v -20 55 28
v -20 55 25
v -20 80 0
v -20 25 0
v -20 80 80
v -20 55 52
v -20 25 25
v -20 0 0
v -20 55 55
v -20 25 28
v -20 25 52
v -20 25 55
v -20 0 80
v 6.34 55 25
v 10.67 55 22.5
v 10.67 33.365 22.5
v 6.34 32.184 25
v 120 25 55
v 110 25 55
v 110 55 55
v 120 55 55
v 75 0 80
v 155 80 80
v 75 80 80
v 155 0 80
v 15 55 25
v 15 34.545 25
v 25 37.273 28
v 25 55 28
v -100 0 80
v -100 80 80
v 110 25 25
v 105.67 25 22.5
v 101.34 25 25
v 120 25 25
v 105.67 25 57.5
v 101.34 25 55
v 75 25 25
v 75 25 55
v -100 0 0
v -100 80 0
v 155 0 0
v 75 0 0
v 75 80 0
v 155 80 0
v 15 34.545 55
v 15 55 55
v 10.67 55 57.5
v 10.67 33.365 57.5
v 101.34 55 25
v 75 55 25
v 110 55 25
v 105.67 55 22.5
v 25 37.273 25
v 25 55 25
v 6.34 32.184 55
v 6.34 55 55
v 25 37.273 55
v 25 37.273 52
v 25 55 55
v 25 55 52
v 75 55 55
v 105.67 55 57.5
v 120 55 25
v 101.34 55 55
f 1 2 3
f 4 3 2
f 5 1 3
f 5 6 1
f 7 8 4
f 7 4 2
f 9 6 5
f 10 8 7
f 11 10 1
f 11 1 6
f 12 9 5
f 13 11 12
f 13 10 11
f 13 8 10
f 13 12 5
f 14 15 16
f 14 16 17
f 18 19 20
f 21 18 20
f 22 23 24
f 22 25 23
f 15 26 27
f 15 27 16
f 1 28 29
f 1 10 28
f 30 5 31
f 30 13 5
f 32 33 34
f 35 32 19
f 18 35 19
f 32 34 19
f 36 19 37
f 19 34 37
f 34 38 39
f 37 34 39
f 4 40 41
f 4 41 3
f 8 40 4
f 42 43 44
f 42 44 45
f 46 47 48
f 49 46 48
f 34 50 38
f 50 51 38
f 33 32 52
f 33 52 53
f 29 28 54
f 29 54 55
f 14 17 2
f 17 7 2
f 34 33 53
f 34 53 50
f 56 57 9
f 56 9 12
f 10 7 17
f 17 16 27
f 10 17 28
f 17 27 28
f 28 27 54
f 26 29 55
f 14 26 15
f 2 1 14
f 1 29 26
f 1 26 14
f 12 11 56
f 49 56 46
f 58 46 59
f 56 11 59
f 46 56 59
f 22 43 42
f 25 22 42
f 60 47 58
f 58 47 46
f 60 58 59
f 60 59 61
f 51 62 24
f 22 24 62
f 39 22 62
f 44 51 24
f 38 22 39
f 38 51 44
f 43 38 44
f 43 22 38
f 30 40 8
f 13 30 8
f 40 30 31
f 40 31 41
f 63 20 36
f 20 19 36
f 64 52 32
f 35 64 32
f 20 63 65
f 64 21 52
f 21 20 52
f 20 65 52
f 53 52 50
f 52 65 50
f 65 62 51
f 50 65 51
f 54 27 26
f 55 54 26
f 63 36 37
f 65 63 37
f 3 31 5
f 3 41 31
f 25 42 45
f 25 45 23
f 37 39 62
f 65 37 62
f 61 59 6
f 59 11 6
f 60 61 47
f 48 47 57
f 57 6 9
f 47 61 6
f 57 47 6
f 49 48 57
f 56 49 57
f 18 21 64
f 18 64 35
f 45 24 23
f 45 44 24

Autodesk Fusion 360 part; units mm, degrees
sketch "Sketch1" plane through (0, 0, 0) normal (0, 1, 0) x (1, 0, 0)
  line L0 (-100, 0) -> (-20, 0)
  line L1 (-20, 0) -> (-20, -80)
  line L2 (-20, -80) -> (-100, -80)
  line L3 (-100, -80) -> (-100, 0)
  line L4 (75, 0) -> (155, 0)
  line L5 (155, 0) -> (155, -80)
  line L6 (155, -80) -> (75, -80)
  line L7 (75, -80) -> (75, 0)
  dimension "d1" = 80
  dimension "d2" = 80
  dimension "d3" = 80
  dimension "d4" = 80
extrude "Extrude1" add sketch "Sketch1" along normal blind 80 contours L0 L1 L2 L3 makes body 1
extrude "Extrude2" add sketch "Sketch1" along normal blind 80 separate body contours L4 L5 L6 L7 makes body 2
sketch "Sketch2" plane through (75, 0, 0) normal (-1, 0, 0) x (0, -1, 0)
  line L0 (0, 0) -> (0, 80)
  line L1 (0, 80) -> (-80, 80)
  line L2 (-80, 80) -> (-80, 0)
  line L3 (-80, 0) -> (0, 0)
  line L4 (-55, 25) -> (-25, 25)
  line L5 (-25, 25) -> (-25, 55)
  line L6 (-25, 55) -> (-55, 55)
  line L7 (-55, 55) -> (-55, 25)
extrude "Extrude3" cut sketch "Sketch2" against normal blind 45 contours L4 L5 L6 L7 bodies 2
sketch "Sketch3" plane through (0, 0, 0) normal (0, -1, 0) x (1, 0, 0)
  line L0 (155, 80) -> (75, 80)
  line L1 (75, 80) -> (75, 0)
  line L2 (75, 0) -> (155, 0)
  line L3 (155, 0) -> (155, 80)
  line L4 (75, 40) -> (155, 40) construction
  line L5 (75, 40) -> (75, 25) construction
  line L6 (75, 40) -> (75, 55) construction
  line L7 (75, 55) -> (120, 55) construction
  line L8 (120, 55) -> (120, 25) construction
  line L9 (120, 25) -> (75, 25) construction
  line L10 (75, 55) -> (120, 55)
  line L11 (120, 25) -> (75, 25)
  line L12 (120, 55) -> (110, 55) construction
  line L13 (110, 55) -> (110, 60) construction
  line L14 (110, 55) -> (105.6699, 57.5)
  line L15 (110, 55) -> (115, 55) construction
  line L16 (105.6699, 57.5) -> (101.3397, 55)
  line L17 (105.6699, 22.5) -> (101.3397, 25)
  line L18 (110, 25) -> (105.6699, 22.5)
  dimension "d11" = 150
  dimension "d12" = 5
sketch "Sketch4" plane through (0, 25, 0) normal (0, 1, 0) x (-1, 0, 0)
  line L0 (-75, 25) -> (-75, 55)
  line L1 (-75, 55) -> (-120, 55)
  line L2 (-120, 55) -> (-120, 25)
  line L3 (-120, 25) -> (-75, 25)
  line L4 (-75, 40) -> (-120, 40) construction
  line L5 (-120, 40) -> (-120, 55) construction
  line L6 (-120, 55) -> (-75, 55) construction
  line L7 (-120, 40) -> (-120, 25) construction
  line L8 (-120, 25) -> (-75, 25)
  line L9 (-110, 25) -> (-105.6699, 22.5)
  line L10 (-105.6699, 22.5) -> (-101.3397, 25)
  line L11 (-105.6699, 57.5) -> (-101.3397, 55)
  line L12 (-110, 55) -> (-105.6699, 57.5)
  dimension "d13" = 150
  dimension "d14" = 5
  dimension "d15" = 5
extrude "Extrude4" cut sketch "Sketch4" along normal up to surface (30 mm away) contours L3 L8 L9 L10 | L1 L11 L12 bodies 2
sketch "Sketch5" plane through (0, 0, 25) normal (0, 0, 1) x (-1, 0, 0)
  line L0 (-101.3397, -55) -> (-75, -55)
  line L1 (-75, -55) -> (-75, -25)
  line L2 (-75, -25) -> (-101.3397, -25)
  line L3 (-101.3397, -55) -> (-75, -55)
  line L4 (-75, -55) -> (-75, -25)
  line L5 (-75, -25) -> (-101.3397, -25)
  line L6 (-110, -55) -> (-120, -55)
  line L7 (-120, -55) -> (-120, -25)
  line L8 (-120, -25) -> (-110, -25)
  line L9 (-101.3397, -55) -> (-110, -55)
  line L10 (-110, -25) -> (-101.3397, -25)
sketch "Sketch6" plane through (120, 0, 0) normal (-1, 0, 0) x (0, -1, 0)
  line L0 (-55, 55) -> (-55, 25)
  line L1 (-55, 25) -> (-25, 25)
  line L2 (-25, 25) -> (-25, 55)
  line L3 (-25, 55) -> (-55, 55)
  line L4 (-25, 25) -> (-25, 55)
  line L5 (-25, 55) -> (-55, 55)
  line L6 (-55, 55) -> (-55, 25)
  line L7 (-55, 25) -> (-25, 25)
sketch "Sketch7" plane through (0, 25, 0) normal (0, 1, 0) x (-1, 0, 0)
  line L0 (-75, 25) -> (-75, 55)
  line L1 (-75, 55) -> (-101.3397, 55)
  line L2 (-101.3397, 55) -> (-105.6699, 57.5)
  line L3 (-105.6699, 57.5) -> (-110, 55)
  line L4 (-110, 55) -> (-120, 55)
  line L5 (-120, 55) -> (-120, 25)
  line L6 (-120, 25) -> (-110, 25)
  line L7 (-110, 25) -> (-105.6699, 22.5)
  line L8 (-105.6699, 22.5) -> (-101.3397, 25)
  line L9 (-101.3397, 25) -> (-75, 25)
  line L10 (-120, 55) -> (-75, 55)
  line L11 (-75, 55) -> (-75, 25)
  line L12 (-120, 25) -> (-75, 25)
  line L13 (-120, 25) -> (-120, 55)
sketch "Sketch8" plane through (0, 55, 0) normal (0, -1, 0) x (1, 0, 0)
  line L0 (75, 55) -> (75, 25)
  line L1 (75, 25) -> (101.3397, 25)
  line L2 (101.3397, 25) -> (105.6699, 22.5)
  line L3 (105.6699, 22.5) -> (110, 25)
  line L4 (110, 25) -> (120, 25)
  line L5 (120, 25) -> (120, 55)
  line L6 (120, 55) -> (110, 55)
  line L7 (110, 55) -> (105.6699, 57.5)
  line L8 (105.6699, 57.5) -> (101.3397, 55)
  line L9 (101.3397, 55) -> (75, 55)
  line L10 (120, 55) -> (120, 25)
  line L11 (120, 25) -> (75, 25)
  line L12 (120, 55) -> (75, 55)
  line L13 (75, 55) -> (75, 25)
  line L14 (101.3397, 25) -> (105.6699, 22.5)
  line L15 (110, 25) -> (105.6699, 22.5)
  line L16 (110, 55) -> (105.6699, 57.5)
  line L17 (105.6699, 57.5) -> (101.3397, 55)
sketch "Sketch9" plane through (0, 0, 55) normal (0, 0, -1) x (1, 0, 0)
  line L0 (101.3397, -25) -> (75, -25)
  line L1 (75, -25) -> (75, -55)
  line L2 (75, -55) -> (101.3397, -55)
  line L3 (75, -55) -> (120, -55)
  line L4 (75, -55) -> (75, -25)
  line L5 (120, -55) -> (120, -25)
  line L6 (120, -25) -> (75, -25)
  line L7 (110, -55) -> (105.67, -55)
  line L8 (105.67, -55) -> (105.67, -25) construction
  dimension "d19" = 4.33
sketch "Sketch10" plane through (-20, 0, 0) normal (1, 0, 0) x (0, 1, 0)
  line L0 (0, 80) -> (0, 0)
  line L1 (0, 0) -> (80, 0)
  line L2 (80, 0) -> (80, 80)
  line L3 (80, 80) -> (0, 80)
  line L4 (55, 55) -> (25, 55)
  line L5 (25, 25) -> (55, 25)
  line L6 (25, 55) -> (25, 52)
  line L7 (25, 52) -> (55, 52)
  line L8 (55, 52) -> (55, 55)
  line L9 (25, 25) -> (25, 28)
  line L10 (25, 28) -> (55, 28)
  line L11 (55, 28) -> (55, 25)
  dimension "d20" = 3
  dimension "d21" = 3
extrude "Extrude5" add sketch "Sketch10" along normal blind 45 contours L4 L6 L7 L8 | L5 L9 L10 L11 bodies 1
sketch "Sketch11" plane through (0, 25, 0) normal (0, -1, 0) x (1, 0, 0)
  line L0 (-20, 55) -> (-20, 52)
  line L1 (-20, 52) -> (25, 52)
  line L2 (25, 52) -> (25, 55)
  line L3 (25, 55) -> (-20, 55)
  line L4 (25, 55) -> (15, 55)
  line L5 (15, 55) -> (10.6699, 57.5)
  line L6 (15, 55) -> (20, 55) construction
  line L7 (10.6699, 57.5) -> (6.3397, 55)
  line L8 (-20, 40) -> (25, 40) construction
  line L9 (15, 25) -> (10.6699, 22.5)
  line L10 (10.6699, 22.5) -> (6.3397, 25)
  dimension "d24" = 150
  dimension "d25" = 5
  dimension "d26" = 5
extrude "Extrude6" add sketch "Sketch11" against normal blind 30 contours L3 L5 L7 bodies 1
sketch "Sketch12" plane through (0, 25, 0) normal (0, -1, 0) x (1, 0, 0)
  line L0 (-20, 28) -> (-20, 25)
  line L1 (-20, 25) -> (25, 25)
  line L2 (25, 25) -> (25, 28)
  line L3 (25, 28) -> (-20, 28)
  line L4 (25, 25) -> (15, 25)
  line L5 (15, 25) -> (10.6699, 22.5)
  line L6 (10.6699, 22.5) -> (6.3397, 25)
  dimension "d29" = 150
  dimension "d30" = 5
  dimension "d31" = 5
extrude "Extrude7" add sketch "Sketch12" against normal blind 30 contours L1 L5 L6 bodies 1
sketch "Sketch13" plane through (0, 0, 0) normal (0, 0, 1) x (1, 0, 0)
  line L0 (-20, 25) -> (35, 40)
  line L1 (35, 40) -> (35, 20)
  line L2 (35, 20) -> (-20, 25)
extrude "Extrude8" cut sketch "Sketch13" along normal blind 70 bodies 1
equation "d19 = ( 8.660 / 2 ) * 1 mm"
